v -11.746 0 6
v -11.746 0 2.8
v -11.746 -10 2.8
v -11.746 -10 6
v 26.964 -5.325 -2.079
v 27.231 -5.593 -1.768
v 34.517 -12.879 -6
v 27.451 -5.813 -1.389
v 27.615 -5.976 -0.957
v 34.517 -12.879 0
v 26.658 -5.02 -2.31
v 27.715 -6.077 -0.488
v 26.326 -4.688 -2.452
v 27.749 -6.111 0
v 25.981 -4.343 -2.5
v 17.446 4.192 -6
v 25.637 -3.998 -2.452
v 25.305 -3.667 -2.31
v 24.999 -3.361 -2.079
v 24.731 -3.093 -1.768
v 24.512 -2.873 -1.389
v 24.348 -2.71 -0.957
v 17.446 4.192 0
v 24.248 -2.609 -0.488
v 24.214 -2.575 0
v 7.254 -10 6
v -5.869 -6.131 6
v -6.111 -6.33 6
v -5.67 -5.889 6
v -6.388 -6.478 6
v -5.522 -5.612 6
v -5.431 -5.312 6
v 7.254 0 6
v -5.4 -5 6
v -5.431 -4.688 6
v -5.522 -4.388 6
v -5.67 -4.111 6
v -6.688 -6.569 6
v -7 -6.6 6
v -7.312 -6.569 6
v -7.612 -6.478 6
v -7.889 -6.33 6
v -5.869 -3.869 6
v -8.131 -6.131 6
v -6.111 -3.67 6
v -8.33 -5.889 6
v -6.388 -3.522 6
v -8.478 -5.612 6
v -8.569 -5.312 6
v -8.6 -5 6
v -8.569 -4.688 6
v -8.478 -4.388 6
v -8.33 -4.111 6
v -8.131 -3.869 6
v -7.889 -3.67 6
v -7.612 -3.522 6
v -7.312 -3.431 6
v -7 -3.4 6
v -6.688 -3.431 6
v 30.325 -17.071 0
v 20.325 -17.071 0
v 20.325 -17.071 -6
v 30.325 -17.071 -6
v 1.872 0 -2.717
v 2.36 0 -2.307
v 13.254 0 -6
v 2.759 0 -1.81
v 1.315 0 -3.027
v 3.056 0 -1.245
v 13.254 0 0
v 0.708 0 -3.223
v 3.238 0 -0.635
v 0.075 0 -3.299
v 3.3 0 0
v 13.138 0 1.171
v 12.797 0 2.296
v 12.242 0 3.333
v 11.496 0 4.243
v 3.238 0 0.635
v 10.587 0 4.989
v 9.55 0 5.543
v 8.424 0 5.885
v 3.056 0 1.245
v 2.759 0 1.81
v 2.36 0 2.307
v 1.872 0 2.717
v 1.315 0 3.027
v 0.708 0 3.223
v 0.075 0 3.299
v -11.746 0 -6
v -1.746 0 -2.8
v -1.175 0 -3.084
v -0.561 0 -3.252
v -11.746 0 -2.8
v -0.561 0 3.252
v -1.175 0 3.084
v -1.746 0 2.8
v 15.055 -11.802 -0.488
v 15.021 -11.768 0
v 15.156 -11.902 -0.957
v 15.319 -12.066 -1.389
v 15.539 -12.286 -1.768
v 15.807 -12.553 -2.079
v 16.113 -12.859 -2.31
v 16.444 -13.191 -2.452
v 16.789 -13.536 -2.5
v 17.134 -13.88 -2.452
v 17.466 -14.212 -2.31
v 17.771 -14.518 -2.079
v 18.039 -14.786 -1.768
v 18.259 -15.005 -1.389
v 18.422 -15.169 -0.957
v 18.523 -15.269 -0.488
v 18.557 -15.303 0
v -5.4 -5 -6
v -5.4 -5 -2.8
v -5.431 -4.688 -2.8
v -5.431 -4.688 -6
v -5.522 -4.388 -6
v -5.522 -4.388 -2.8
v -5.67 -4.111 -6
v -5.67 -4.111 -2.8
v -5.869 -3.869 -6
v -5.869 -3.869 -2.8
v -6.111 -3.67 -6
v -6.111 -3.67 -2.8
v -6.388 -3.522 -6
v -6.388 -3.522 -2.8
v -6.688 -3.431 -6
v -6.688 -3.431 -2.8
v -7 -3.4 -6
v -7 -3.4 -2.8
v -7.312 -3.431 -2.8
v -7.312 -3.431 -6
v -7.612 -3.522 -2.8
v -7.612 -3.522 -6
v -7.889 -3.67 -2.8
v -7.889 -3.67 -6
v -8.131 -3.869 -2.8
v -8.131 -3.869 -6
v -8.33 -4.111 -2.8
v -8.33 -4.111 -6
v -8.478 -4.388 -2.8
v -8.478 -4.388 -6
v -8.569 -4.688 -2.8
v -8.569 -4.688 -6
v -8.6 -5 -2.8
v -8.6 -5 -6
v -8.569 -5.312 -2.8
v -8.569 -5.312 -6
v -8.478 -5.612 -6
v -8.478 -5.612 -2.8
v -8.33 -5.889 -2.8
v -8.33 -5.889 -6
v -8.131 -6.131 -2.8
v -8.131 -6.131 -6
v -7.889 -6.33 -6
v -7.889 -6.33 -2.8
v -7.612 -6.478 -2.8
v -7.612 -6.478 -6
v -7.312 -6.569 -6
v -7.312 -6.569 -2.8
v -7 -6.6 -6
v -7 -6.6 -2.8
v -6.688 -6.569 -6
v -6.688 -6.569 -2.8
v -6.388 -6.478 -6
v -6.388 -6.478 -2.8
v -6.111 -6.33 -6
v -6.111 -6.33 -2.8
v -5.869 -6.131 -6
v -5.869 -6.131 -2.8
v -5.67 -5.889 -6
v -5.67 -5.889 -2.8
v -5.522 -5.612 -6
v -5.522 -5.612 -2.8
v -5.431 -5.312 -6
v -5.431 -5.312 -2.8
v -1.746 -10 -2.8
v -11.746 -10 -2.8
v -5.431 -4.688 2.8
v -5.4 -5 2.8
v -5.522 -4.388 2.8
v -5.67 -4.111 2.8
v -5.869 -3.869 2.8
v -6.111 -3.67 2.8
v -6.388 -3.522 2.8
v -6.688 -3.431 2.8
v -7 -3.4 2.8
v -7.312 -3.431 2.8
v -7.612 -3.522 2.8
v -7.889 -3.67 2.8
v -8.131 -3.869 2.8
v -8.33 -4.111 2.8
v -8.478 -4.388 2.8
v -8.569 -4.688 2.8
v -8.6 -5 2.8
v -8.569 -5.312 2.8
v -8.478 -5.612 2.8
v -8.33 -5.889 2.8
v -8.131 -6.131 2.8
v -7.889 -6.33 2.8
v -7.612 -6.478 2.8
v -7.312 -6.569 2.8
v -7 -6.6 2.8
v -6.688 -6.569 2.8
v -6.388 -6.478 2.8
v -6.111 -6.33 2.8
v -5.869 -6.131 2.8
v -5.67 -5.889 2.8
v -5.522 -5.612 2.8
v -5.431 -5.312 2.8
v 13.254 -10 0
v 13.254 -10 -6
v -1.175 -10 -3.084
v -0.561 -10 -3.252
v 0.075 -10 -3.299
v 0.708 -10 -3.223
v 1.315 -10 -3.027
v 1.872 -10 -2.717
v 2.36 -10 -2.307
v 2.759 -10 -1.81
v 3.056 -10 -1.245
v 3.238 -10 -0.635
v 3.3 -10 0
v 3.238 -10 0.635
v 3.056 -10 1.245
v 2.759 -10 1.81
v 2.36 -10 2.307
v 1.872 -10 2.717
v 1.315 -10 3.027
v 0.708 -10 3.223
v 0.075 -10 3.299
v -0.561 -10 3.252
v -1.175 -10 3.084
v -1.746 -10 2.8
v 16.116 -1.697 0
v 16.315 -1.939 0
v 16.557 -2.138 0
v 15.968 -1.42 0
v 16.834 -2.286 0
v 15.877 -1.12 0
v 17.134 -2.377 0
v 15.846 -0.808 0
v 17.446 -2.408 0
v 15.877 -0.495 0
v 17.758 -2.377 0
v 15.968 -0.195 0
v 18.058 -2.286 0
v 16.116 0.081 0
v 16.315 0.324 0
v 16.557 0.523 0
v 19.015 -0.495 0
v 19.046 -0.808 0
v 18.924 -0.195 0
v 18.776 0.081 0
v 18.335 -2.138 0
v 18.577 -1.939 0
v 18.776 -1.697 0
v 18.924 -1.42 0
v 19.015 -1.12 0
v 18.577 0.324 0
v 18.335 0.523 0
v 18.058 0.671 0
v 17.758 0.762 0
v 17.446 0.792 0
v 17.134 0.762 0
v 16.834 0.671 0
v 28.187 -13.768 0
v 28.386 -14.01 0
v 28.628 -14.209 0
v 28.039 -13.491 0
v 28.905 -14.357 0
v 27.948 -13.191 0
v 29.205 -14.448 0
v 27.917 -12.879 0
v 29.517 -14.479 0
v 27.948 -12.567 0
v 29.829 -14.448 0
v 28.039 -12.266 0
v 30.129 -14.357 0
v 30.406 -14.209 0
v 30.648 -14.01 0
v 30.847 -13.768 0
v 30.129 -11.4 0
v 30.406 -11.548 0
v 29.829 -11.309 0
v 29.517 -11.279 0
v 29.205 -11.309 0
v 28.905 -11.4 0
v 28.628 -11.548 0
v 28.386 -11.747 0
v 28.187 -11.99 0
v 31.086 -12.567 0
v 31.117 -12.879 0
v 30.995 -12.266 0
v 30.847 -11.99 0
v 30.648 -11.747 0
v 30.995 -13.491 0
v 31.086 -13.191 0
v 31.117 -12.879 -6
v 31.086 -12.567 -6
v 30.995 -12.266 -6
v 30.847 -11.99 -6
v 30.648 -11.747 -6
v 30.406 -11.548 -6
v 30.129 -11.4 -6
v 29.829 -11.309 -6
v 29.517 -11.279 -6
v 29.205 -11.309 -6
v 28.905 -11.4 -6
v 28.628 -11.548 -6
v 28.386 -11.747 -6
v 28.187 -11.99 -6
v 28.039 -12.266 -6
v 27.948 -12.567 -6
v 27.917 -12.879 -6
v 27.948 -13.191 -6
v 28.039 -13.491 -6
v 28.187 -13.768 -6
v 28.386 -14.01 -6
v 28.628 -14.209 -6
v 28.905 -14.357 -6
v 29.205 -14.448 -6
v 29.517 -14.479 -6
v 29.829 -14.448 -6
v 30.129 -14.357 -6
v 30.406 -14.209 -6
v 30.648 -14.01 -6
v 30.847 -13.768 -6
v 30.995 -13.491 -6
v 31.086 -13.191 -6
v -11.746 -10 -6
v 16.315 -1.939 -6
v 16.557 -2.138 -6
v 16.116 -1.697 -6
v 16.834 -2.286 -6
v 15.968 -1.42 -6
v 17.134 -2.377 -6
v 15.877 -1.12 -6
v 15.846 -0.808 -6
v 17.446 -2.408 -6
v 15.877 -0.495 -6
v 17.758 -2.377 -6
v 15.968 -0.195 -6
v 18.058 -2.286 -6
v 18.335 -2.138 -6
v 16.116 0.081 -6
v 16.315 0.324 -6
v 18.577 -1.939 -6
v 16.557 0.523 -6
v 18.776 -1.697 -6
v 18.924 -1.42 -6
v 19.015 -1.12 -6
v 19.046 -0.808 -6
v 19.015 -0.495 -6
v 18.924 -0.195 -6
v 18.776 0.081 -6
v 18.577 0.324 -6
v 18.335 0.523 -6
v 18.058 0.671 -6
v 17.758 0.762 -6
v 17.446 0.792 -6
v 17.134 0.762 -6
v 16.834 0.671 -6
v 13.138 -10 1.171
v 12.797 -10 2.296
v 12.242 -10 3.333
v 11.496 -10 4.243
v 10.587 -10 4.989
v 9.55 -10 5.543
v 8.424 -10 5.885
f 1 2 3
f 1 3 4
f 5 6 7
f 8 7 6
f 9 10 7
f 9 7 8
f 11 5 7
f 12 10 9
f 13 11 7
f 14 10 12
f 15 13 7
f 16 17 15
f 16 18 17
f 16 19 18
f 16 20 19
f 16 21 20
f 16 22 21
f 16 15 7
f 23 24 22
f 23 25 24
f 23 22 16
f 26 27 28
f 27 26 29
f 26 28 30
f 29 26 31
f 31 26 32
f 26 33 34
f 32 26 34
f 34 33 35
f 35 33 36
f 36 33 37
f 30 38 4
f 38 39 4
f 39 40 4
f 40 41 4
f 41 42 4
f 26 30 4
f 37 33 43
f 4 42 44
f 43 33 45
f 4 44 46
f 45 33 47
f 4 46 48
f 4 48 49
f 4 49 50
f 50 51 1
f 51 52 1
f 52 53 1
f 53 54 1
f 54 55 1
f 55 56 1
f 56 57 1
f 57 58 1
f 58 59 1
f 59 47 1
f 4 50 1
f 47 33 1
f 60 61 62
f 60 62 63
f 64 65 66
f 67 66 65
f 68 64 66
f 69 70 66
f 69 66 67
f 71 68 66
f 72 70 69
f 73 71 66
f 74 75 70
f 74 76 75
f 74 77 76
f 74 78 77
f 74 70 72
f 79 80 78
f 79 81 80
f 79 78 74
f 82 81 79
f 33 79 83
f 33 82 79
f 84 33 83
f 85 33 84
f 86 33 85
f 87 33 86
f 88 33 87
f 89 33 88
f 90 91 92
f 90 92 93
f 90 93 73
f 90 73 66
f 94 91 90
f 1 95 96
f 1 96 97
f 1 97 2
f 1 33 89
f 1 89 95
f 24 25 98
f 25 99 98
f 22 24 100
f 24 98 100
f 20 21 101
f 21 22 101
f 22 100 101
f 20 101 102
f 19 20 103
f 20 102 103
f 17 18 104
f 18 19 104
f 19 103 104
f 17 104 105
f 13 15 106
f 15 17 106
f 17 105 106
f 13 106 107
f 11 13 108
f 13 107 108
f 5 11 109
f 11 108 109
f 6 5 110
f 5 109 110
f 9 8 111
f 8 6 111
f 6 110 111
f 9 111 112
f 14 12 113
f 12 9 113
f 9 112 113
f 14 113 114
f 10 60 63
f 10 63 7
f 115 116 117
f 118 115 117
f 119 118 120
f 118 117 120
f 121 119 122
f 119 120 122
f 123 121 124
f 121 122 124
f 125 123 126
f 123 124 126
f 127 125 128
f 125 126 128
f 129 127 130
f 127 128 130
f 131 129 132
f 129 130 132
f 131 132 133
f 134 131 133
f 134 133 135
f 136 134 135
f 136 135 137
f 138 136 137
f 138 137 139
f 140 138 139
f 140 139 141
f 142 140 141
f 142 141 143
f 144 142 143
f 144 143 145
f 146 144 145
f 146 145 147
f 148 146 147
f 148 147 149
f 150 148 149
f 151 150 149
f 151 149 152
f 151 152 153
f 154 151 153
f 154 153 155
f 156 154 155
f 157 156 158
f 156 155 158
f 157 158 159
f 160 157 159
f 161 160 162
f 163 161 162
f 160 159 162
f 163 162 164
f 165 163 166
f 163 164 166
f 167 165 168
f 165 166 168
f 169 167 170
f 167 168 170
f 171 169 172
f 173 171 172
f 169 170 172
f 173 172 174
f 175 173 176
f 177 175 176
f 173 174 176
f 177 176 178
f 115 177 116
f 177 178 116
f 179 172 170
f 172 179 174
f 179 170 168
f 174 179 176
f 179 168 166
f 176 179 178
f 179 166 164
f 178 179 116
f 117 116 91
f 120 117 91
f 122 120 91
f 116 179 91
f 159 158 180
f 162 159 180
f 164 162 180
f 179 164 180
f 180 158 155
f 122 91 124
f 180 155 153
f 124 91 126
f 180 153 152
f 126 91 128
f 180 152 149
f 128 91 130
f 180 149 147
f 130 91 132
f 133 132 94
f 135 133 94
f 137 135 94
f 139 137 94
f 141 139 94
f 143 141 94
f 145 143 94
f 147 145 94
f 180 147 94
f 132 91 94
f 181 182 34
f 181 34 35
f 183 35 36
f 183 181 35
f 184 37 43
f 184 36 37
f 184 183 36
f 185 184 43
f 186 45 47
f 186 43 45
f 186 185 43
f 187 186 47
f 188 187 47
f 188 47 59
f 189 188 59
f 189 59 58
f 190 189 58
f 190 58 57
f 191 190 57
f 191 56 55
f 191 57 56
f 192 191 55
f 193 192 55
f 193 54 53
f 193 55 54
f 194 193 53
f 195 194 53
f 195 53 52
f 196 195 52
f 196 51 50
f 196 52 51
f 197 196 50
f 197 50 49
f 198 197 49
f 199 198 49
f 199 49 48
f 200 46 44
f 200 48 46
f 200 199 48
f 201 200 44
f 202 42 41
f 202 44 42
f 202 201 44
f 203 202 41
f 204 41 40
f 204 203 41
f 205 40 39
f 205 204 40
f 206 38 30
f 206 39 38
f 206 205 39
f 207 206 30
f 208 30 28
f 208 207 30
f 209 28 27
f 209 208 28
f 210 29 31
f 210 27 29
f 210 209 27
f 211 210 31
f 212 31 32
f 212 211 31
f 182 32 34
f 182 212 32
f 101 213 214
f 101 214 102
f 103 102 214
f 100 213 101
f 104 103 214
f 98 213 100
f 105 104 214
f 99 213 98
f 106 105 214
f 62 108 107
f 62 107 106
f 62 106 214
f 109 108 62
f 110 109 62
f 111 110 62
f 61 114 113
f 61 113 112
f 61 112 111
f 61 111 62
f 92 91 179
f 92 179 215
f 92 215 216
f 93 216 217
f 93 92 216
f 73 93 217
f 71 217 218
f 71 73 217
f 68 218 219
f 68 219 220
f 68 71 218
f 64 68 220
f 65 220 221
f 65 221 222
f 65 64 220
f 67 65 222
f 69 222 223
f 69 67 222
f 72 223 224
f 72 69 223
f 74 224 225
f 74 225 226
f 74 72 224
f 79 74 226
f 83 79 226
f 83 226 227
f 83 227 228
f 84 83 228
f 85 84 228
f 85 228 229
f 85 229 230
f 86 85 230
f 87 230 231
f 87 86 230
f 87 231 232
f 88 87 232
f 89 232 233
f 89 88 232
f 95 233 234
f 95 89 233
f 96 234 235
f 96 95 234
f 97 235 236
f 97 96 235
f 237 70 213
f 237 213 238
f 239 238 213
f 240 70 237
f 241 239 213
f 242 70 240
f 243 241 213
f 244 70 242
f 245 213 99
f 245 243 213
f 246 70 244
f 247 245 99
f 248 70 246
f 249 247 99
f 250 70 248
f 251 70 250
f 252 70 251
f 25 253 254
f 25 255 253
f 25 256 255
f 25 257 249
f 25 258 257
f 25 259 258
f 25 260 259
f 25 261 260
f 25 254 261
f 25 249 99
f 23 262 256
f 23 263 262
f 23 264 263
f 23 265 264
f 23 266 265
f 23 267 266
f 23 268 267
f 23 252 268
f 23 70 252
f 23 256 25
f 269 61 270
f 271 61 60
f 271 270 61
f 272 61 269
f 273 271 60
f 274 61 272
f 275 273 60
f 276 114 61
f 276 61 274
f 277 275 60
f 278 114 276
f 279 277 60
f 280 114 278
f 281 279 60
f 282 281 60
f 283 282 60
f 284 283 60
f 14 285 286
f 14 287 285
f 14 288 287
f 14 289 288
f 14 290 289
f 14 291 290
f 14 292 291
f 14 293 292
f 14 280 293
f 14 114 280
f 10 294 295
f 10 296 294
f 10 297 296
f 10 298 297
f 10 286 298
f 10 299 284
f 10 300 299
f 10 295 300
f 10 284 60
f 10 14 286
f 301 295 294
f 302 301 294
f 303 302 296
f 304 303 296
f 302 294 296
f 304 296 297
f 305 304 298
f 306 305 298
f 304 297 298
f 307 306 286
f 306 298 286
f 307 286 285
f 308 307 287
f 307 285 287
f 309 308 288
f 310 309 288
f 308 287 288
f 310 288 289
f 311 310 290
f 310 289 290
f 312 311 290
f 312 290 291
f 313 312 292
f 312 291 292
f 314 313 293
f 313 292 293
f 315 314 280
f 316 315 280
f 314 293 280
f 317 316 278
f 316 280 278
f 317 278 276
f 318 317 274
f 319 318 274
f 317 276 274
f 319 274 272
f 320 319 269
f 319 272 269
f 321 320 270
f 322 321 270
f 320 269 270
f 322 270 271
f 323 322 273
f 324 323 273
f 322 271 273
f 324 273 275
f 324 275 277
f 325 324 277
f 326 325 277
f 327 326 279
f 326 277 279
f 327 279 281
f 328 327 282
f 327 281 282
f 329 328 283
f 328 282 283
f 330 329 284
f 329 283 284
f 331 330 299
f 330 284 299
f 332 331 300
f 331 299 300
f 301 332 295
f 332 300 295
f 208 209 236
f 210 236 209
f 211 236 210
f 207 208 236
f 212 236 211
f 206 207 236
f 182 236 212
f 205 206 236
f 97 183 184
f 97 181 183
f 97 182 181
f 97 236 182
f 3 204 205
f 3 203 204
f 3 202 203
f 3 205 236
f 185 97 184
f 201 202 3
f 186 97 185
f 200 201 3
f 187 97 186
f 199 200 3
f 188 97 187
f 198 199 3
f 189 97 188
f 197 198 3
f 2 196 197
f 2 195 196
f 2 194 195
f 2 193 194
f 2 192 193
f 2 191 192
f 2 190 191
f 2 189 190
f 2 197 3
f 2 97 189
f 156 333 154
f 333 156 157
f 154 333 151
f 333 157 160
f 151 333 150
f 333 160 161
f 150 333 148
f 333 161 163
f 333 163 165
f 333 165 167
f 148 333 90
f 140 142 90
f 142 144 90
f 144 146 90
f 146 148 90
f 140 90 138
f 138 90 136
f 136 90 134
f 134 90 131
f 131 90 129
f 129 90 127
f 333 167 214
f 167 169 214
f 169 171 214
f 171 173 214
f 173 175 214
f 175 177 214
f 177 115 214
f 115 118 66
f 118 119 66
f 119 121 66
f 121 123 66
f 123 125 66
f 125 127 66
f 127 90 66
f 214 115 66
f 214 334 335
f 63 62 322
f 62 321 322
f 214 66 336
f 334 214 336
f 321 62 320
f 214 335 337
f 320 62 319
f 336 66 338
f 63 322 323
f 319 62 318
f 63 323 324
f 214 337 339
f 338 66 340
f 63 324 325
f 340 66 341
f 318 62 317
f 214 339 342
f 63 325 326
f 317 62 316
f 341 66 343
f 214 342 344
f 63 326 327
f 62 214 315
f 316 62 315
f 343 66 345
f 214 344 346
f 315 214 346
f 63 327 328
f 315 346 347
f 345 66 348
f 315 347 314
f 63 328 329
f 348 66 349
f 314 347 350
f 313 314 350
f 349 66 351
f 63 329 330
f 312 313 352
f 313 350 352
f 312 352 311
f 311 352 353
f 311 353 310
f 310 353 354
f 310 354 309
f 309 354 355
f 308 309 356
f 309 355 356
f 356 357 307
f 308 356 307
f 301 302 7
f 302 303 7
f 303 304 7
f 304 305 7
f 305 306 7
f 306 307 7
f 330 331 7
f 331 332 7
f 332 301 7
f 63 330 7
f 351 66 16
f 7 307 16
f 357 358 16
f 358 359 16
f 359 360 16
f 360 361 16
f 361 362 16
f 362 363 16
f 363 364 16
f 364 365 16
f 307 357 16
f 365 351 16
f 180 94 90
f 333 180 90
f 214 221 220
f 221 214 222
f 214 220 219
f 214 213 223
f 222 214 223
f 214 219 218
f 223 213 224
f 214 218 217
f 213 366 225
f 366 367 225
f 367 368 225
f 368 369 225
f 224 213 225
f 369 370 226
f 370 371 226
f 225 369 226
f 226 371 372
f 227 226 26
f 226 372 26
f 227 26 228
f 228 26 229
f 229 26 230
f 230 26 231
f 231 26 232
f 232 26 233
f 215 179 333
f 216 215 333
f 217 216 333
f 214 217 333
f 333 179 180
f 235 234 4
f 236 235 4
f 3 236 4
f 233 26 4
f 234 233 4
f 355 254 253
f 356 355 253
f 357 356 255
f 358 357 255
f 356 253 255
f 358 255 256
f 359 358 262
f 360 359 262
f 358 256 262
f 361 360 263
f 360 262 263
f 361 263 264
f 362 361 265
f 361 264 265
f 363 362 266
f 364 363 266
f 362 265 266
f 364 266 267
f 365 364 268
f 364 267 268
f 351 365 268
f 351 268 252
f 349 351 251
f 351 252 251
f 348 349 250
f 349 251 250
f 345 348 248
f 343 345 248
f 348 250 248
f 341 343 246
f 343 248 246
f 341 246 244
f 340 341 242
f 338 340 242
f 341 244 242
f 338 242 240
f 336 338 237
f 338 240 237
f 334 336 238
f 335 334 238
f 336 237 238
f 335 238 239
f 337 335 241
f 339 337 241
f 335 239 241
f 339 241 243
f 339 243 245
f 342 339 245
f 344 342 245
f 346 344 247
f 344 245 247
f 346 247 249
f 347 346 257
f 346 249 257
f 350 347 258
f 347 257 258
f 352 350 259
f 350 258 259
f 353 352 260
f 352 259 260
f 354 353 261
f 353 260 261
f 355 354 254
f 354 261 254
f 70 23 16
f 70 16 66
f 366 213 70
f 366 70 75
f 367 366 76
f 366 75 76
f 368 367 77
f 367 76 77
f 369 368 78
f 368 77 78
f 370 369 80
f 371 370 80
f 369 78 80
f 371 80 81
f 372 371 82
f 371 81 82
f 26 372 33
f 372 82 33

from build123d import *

# Parameters (mm, degrees)
PAD_DEPTH            = 10
SKETCH_R             = 1.6
PAD001_DEPTH         = 6
SKETCH004_R          = 2.5
POCKET_DEPTH         = 27.372693
SKETCH005_R          = 1.6
POCKET001_DEPTH      = 6.001
POCKET001_DEPTH_BACK = -6.001


with BuildPart() as part:
    # Sketch003 → Pad (new body)
    with BuildSketch(Plane.XZ):
        with BuildLine():
            Line((13.253575, -6), (-11.746425, -6))
            Line((-11.746425, -2.8), (-11.746425, -6))
            Line((-1.746425, -2.8), (-11.746425, -2.8))
            ThreePointArc((-1.746425, -2.8), (3.3, 0), (-1.746425, 2.8))
            Line((-1.746425, 2.8), (-11.746425, 2.8))
            Line((-11.746425, 2.8), (-11.746425, 6))
            Line((7.253575, 6), (-11.746425, 6))
            ThreePointArc((13.253575, 0), (11.496216, 4.242641), (7.253575, 6))
            Line((13.253575, 0), (13.253575, -6))
        make_face()
    extrude(amount=PAD_DEPTH)

    # Sketch → Pad001 (join)
    with BuildSketch(Plane.XY):
        Polygon((13.253575, -10), (20.324643, -17.071068), (30.324643, -17.071068), (34.517031, -12.87868), (17.445963, 4.192388), (13.253575, 0), align=None)
        with Locations((17.445963, -0.807612)):
            Circle(SKETCH_R, mode=Mode.SUBTRACT)
        with Locations((29.517031, -12.87868)):
            Circle(SKETCH_R, mode=Mode.SUBTRACT)
    extrude(amount=-PAD001_DEPTH)

    # Sketch004 (on DatumPlane) → Pocket (cut, through all)
    with BuildSketch(Plane(origin=(0, 0, 3.5), x_dir=(0, 0, -1), z_dir=(-0.707107, -0.707107, 0))):
        with Locations((3.5, 21.442761)):
            Circle(SKETCH004_R)
    extrude(amount=-POCKET_DEPTH, mode=Mode.SUBTRACT)

    # Sketch005 → Pocket001 (cut, two sides)
    with BuildSketch(Plane.XY) as pocket001_sk:
        with Locations((-7, -5)):
            Circle(SKETCH005_R)
    extrude(amount=-POCKET001_DEPTH, mode=Mode.SUBTRACT)
    extrude(pocket001_sk.sketch, amount=-POCKET001_DEPTH_BACK, mode=Mode.SUBTRACT)


solid = part.part
